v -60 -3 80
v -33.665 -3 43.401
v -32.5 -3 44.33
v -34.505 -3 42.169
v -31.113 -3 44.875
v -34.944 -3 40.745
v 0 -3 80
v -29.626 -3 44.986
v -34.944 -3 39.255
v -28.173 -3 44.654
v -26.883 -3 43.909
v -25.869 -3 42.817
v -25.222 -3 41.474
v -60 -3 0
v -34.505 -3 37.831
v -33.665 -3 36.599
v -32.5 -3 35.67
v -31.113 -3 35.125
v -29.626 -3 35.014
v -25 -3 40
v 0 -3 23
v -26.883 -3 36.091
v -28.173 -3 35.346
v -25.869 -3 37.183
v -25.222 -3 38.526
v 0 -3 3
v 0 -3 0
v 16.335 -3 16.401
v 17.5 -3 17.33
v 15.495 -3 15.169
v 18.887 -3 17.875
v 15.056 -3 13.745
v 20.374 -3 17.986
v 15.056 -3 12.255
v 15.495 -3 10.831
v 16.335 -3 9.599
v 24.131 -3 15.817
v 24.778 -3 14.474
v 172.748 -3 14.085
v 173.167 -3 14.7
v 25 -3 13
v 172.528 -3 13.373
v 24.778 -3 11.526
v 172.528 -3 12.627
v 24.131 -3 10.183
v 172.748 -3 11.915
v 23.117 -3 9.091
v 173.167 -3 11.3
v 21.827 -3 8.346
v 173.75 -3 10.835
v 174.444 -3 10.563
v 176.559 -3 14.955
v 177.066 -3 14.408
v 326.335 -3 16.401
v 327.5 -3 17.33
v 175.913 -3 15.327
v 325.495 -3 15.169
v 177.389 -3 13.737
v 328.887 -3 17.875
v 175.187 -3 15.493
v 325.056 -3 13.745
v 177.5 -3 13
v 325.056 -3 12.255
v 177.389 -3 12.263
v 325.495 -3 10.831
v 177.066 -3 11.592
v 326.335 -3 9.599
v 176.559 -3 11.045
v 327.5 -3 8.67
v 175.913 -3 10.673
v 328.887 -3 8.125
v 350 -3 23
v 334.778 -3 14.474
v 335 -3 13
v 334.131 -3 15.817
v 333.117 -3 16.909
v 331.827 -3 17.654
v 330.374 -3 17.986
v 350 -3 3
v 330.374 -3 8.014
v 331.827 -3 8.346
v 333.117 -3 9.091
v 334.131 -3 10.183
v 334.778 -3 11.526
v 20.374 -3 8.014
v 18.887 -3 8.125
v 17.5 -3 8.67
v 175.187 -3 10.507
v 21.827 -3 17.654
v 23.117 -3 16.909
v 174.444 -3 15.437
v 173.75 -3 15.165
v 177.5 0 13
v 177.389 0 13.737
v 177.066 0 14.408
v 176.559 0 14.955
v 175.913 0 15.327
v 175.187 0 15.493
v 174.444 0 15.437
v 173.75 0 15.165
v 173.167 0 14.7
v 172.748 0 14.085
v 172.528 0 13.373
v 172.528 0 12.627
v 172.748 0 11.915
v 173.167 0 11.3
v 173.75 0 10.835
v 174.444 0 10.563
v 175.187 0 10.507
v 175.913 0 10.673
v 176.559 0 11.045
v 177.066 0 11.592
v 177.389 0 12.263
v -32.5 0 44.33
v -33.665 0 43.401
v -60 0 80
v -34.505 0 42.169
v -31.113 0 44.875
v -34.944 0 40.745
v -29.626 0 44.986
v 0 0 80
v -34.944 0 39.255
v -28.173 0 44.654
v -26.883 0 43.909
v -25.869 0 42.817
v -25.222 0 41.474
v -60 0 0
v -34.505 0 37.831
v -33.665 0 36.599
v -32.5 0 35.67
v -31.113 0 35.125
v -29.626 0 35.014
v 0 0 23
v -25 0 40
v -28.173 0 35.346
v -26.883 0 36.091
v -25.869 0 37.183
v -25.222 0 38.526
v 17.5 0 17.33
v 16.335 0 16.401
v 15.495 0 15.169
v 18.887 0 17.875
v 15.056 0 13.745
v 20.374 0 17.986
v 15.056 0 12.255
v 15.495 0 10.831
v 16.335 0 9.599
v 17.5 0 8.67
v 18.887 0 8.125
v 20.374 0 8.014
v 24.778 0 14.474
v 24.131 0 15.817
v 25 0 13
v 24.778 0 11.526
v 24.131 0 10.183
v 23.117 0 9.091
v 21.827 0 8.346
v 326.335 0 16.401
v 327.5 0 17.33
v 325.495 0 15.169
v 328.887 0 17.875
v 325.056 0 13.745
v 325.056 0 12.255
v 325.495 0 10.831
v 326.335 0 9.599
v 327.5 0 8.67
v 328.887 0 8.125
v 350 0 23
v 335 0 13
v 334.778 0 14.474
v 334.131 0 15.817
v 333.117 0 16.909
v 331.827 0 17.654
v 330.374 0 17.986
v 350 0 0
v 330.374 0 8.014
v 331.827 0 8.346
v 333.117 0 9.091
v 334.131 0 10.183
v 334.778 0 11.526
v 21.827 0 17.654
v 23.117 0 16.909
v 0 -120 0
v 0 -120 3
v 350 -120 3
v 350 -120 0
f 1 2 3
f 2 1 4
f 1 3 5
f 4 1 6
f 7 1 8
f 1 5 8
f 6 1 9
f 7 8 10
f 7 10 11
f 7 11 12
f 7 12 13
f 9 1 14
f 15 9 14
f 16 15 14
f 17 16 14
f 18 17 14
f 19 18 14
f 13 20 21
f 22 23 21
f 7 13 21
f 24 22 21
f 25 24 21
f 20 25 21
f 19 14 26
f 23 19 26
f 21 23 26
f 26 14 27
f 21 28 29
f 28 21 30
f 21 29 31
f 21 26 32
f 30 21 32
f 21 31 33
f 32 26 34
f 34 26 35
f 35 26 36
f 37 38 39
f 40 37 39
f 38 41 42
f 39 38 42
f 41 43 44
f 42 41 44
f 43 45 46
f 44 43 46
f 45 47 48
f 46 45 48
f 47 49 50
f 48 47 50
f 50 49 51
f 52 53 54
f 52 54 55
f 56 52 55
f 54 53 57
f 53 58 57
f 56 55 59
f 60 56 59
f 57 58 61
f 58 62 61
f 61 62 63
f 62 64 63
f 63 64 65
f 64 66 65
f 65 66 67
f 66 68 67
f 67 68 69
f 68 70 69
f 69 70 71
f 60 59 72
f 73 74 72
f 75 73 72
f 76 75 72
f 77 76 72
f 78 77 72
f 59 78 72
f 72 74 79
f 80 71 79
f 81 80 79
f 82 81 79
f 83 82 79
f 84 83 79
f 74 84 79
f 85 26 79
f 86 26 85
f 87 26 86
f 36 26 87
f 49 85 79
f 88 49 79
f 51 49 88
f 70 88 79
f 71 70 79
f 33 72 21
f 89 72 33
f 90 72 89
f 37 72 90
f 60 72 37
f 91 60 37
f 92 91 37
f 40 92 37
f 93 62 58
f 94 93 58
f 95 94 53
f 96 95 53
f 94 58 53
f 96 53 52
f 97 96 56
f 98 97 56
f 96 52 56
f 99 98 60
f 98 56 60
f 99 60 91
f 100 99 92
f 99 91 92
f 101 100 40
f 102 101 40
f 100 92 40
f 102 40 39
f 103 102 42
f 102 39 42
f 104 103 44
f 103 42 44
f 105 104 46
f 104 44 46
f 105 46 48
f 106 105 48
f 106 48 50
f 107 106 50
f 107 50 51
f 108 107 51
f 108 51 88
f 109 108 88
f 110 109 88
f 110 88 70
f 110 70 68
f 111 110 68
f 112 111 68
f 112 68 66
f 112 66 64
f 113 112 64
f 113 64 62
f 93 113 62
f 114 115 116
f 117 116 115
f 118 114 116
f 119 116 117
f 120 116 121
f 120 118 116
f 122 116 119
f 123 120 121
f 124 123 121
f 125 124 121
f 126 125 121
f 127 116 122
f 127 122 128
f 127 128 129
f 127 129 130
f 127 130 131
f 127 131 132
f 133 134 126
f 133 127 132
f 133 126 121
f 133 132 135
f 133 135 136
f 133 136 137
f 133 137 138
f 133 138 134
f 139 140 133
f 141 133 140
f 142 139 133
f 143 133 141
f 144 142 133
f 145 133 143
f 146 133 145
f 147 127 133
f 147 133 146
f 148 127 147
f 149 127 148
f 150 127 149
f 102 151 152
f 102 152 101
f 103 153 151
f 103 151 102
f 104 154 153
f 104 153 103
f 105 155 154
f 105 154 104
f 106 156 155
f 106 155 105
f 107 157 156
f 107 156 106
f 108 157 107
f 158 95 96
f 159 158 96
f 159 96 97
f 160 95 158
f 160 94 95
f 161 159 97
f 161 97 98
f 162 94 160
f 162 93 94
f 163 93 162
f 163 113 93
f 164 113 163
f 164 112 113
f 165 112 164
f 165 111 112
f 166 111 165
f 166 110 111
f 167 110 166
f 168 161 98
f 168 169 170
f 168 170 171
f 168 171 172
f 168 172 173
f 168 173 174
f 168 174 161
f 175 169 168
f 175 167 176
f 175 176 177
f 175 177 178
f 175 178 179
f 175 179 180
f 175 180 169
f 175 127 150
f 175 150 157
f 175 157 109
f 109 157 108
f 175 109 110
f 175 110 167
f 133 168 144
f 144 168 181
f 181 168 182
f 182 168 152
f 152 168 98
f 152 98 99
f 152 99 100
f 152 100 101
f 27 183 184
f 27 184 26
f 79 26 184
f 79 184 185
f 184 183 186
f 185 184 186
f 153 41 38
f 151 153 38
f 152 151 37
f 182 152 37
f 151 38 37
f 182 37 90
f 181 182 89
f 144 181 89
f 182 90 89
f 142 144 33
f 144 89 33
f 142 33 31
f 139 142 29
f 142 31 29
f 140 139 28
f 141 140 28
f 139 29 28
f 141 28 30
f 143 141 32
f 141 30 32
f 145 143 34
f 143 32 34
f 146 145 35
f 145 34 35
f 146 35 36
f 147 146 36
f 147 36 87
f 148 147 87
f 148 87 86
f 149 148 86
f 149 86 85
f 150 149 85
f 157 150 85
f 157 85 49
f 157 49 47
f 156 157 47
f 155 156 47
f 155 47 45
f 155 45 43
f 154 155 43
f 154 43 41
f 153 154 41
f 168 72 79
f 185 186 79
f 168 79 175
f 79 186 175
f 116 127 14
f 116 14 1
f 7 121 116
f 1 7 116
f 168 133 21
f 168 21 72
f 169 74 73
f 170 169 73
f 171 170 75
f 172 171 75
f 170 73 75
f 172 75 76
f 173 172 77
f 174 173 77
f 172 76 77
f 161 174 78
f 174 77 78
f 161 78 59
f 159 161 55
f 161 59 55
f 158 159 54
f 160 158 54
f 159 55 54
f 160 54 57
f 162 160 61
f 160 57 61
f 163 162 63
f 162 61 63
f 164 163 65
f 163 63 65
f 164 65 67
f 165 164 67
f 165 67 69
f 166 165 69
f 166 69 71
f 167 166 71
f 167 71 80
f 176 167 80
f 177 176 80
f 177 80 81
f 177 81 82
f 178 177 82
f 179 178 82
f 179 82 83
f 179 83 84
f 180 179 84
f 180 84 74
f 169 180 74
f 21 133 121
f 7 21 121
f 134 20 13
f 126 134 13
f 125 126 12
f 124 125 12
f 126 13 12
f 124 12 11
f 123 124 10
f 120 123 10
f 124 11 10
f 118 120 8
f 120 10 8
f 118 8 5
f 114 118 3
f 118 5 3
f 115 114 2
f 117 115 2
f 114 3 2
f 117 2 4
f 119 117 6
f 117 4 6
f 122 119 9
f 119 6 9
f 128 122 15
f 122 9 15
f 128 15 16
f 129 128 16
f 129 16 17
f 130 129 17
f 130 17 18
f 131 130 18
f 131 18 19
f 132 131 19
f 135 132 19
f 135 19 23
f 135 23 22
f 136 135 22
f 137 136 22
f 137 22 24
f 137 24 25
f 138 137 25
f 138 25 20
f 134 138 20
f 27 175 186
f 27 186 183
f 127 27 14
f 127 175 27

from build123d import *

# Parameters (mm, degrees)
F0_W      = 350
F0_H      = 120
F1_DEPTH  = 3
F2_W      = 60
F2_H      = 80
F3_DEPTH  = 3
F4_R      = 5
F5_DEPTH  = 25
F6_W      = 350
F6_H      = 3
F7_DEPTH  = 20
F8_R      = 5
F9_DEPTH  = 25
F11_R     = 2.5
F12_DEPTH = 25


with BuildPart() as f1:
    # F0 (on Top) → F1 (new body)
    with BuildSketch(Plane.XY):
        with Locations((175, -60)):
            Rectangle(F0_W, F0_H)
    extrude(amount=F1_DEPTH)

    # F2 (on face) → F3 (join)
    with BuildSketch(Plane(origin=(0, 0, 0), x_dir=(-1, 0, 0), z_dir=(0, 1, 0))):
        with Locations((30, 40)):
            Rectangle(F2_W, F2_H)
    extrude(amount=-F3_DEPTH)

    # F4 (on face) → F5 (cut)
    with BuildSketch(Plane.XZ.offset(3)):
        with Locations((-30, 40)):
            Circle(F4_R)
    extrude(amount=-F5_DEPTH, mode=Mode.SUBTRACT)

    # F6 (on face) → F7 (join)
    with BuildSketch(Plane.XY.offset(3)):
        with Locations((175, -1.5)):
            Rectangle(F6_W, F6_H)
    extrude(amount=F7_DEPTH)

    # F8 (on face) → F9 (cut)
    with BuildSketch(Plane.XZ.offset(3)):
        with Locations((330, 13)):
            Circle(F8_R)
        with Locations((20, 13)):
            Circle(F8_R)
    extrude(amount=-F9_DEPTH, mode=Mode.SUBTRACT)

    # F11 (on face) → F12 (cut)
    with BuildSketch(Plane.XZ.offset(3)):
        with Locations((175, 13)):
            Circle(F11_R)
    extrude(amount=-F12_DEPTH, mode=Mode.SUBTRACT)


solid = f1.part
